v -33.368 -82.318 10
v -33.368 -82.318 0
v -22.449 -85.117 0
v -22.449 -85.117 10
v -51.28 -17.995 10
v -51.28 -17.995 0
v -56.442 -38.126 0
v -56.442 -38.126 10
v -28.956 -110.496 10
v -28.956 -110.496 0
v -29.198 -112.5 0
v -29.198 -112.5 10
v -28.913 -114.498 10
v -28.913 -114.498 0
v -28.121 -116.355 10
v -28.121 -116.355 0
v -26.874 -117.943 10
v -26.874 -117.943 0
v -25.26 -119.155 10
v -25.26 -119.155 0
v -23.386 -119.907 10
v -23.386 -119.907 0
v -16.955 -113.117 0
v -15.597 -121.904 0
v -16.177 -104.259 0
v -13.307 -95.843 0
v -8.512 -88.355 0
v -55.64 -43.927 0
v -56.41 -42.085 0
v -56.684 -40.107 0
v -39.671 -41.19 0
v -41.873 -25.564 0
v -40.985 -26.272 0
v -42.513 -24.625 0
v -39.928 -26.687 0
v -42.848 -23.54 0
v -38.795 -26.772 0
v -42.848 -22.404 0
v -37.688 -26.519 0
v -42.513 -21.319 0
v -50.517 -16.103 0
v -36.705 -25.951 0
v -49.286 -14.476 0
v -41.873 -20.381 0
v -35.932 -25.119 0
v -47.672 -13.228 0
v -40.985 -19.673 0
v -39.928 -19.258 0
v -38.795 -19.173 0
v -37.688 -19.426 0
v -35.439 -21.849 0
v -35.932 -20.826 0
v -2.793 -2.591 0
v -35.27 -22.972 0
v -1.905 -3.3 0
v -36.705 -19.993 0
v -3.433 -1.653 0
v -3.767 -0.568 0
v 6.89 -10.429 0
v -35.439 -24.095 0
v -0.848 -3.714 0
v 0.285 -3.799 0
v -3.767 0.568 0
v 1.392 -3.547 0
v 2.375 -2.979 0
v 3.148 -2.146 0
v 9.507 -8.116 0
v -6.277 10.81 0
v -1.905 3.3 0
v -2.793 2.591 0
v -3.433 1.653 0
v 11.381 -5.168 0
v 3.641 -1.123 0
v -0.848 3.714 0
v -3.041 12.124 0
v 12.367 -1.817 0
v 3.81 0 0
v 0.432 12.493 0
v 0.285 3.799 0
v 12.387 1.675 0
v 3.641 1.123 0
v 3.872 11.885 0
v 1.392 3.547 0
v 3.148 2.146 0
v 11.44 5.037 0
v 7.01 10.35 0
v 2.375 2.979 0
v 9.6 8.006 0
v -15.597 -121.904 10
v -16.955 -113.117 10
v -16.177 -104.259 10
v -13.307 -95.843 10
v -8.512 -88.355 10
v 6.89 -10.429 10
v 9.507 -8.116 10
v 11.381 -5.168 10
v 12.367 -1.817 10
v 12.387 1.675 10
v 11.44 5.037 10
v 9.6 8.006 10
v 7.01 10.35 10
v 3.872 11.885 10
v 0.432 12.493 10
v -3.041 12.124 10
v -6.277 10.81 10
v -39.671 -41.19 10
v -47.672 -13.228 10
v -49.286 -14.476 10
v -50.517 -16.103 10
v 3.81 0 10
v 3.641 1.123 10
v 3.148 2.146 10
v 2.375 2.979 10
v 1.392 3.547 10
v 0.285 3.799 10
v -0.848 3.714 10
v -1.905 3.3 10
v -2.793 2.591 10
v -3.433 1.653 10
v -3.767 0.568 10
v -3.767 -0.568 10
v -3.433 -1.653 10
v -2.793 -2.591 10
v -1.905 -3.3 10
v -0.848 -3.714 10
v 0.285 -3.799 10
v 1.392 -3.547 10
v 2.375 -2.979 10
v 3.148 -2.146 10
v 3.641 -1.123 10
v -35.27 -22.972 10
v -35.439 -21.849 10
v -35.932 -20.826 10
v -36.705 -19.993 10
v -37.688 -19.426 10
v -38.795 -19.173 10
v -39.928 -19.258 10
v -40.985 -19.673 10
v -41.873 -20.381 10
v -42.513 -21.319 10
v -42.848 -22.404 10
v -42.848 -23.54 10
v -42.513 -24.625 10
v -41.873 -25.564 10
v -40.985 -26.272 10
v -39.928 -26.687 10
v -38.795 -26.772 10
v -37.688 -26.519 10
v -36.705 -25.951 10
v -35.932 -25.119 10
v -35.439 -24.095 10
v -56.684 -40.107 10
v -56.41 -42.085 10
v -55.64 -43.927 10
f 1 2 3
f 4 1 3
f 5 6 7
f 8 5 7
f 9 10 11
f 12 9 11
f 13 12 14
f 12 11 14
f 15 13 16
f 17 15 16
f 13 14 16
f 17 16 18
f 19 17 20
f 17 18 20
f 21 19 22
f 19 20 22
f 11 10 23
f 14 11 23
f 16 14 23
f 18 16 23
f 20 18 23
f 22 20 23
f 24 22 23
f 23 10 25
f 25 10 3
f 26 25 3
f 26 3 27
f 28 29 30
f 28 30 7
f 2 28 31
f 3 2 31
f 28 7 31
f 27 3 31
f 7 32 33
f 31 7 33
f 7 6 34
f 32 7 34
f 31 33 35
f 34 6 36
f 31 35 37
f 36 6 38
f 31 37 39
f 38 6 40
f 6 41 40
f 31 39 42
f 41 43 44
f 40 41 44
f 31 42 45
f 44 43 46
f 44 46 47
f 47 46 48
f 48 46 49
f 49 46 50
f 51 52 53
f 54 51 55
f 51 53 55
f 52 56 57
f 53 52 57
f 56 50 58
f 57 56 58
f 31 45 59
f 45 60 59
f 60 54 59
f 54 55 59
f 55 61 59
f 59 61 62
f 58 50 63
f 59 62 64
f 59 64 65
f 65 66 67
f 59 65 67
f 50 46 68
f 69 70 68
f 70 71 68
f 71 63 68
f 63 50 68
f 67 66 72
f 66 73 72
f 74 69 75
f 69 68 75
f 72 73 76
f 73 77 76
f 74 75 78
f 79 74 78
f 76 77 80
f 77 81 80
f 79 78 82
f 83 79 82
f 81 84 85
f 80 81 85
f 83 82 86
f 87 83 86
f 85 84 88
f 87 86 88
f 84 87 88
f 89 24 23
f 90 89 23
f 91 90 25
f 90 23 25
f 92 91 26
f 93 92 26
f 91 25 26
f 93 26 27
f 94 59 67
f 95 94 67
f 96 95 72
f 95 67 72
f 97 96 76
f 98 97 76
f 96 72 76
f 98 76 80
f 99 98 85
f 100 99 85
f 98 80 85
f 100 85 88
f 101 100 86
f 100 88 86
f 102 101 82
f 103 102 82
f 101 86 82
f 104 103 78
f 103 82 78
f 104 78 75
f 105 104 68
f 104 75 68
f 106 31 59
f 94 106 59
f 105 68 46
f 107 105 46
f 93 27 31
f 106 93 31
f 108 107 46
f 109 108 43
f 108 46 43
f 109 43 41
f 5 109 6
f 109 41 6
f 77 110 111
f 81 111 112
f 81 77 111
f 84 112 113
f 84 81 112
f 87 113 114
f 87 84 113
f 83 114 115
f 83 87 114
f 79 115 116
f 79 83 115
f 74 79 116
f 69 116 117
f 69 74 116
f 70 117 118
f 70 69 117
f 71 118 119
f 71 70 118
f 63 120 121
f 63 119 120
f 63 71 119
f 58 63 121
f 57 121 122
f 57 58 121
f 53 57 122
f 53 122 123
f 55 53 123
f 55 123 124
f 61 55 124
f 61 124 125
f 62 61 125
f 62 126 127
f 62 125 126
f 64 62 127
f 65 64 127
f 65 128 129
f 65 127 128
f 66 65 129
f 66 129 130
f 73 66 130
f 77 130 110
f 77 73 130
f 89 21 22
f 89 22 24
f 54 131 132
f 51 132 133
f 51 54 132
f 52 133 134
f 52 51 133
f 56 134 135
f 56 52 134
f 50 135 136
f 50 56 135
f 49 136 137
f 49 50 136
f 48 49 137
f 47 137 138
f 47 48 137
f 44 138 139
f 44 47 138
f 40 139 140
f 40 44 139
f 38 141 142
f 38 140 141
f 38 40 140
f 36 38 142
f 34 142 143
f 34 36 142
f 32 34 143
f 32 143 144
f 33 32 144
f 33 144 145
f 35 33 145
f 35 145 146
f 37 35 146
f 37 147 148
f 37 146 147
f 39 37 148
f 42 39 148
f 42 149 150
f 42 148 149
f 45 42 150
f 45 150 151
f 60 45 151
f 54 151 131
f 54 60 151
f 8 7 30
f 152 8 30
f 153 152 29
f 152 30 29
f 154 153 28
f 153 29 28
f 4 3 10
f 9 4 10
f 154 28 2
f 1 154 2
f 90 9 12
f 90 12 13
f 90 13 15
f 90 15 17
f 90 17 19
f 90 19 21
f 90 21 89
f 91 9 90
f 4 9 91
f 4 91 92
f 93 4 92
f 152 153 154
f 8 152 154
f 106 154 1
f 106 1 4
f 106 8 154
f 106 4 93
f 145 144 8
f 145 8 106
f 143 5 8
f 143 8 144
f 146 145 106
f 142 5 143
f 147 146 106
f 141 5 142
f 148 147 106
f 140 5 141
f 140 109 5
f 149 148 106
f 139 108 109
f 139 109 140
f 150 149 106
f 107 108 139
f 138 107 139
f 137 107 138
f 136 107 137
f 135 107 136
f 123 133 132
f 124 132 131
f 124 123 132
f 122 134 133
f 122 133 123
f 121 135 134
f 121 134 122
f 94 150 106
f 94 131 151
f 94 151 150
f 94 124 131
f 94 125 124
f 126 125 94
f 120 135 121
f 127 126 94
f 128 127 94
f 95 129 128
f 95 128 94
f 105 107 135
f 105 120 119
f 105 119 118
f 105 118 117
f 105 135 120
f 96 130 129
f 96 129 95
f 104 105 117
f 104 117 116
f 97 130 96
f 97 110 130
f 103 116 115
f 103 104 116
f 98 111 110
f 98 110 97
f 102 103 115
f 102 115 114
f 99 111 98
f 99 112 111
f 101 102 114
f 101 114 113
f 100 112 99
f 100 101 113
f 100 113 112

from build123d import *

# Parameters (mm, degrees)
SALIENTE_EXTRUIR1_DEPTH    = 10
CROQUIS4_R                 = 3.81
CORTAR_EXTRUIR1_DEPTH      = 61.468
CORTAR_EXTRUIR1_DEPTH_BACK = 64.008


with BuildPart() as part:
    # Croquis2 → Saliente-Extruir1 (new body)
    with BuildSketch(Plane.XY):
        with BuildLine():
            Line((-51.279919423, -17.994736431), (-56.441706153, -38.125704677))
            ThreePointArc((-56.441706153, -38.125704677), (-56.611211976, -41.10511644), (-55.639925501, -43.92685868))
            Line((-55.639925501, -43.92685868), (-33.368069091, -82.317782173))
            Line((-33.368069091, -82.317782173), (-22.449197371, -85.11749287))
            Line((-22.449197371, -85.11749287), (-28.956418222, -110.495654186))
            ThreePointArc((-28.956418222, -110.495654186), (-28.120578041, -116.354933217), (-23.386413845, -119.907040892))
            Line((-23.386413845, -119.907040892), (-15.596975427, -121.904332794))
            ThreePointArc((-15.596975427, -121.904332794), (-16.177038504, -104.258895505), (-8.511603611, -88.354838218))
            Line((-8.511603611, -88.354838218), (-39.670979585, -41.190293696))
            Line((-39.670979585, -41.190293696), (6.890267505, -10.429487701))
            ThreePointArc((6.890267505, -10.429487701), (10.624002053, 6.586393579), (-6.277032388, 10.809665323))
            Line((-6.277032388, 10.809665323), (-47.67245646, -13.22812029))
            ThreePointArc((-47.67245646, -13.22812029), (-49.955399161, -15.248752476), (-51.279919423, -17.994736431))
        make_face()
    extrude(amount=SALIENTE_EXTRUIR1_DEPTH)

    # Croquis4 → Cortar-Extruir1 (cut, two sides)
    with BuildSketch(Plane.XY) as cortar_extruir1_sk:
        Circle(CROQUIS4_R)
        with Locations((-39.080143485, -22.972272641)):
            Circle(CROQUIS4_R)
    extrude(amount=CORTAR_EXTRUIR1_DEPTH, mode=Mode.SUBTRACT)
    extrude(cortar_extruir1_sk.sketch, amount=-CORTAR_EXTRUIR1_DEPTH_BACK, mode=Mode.SUBTRACT)


solid = part.part
